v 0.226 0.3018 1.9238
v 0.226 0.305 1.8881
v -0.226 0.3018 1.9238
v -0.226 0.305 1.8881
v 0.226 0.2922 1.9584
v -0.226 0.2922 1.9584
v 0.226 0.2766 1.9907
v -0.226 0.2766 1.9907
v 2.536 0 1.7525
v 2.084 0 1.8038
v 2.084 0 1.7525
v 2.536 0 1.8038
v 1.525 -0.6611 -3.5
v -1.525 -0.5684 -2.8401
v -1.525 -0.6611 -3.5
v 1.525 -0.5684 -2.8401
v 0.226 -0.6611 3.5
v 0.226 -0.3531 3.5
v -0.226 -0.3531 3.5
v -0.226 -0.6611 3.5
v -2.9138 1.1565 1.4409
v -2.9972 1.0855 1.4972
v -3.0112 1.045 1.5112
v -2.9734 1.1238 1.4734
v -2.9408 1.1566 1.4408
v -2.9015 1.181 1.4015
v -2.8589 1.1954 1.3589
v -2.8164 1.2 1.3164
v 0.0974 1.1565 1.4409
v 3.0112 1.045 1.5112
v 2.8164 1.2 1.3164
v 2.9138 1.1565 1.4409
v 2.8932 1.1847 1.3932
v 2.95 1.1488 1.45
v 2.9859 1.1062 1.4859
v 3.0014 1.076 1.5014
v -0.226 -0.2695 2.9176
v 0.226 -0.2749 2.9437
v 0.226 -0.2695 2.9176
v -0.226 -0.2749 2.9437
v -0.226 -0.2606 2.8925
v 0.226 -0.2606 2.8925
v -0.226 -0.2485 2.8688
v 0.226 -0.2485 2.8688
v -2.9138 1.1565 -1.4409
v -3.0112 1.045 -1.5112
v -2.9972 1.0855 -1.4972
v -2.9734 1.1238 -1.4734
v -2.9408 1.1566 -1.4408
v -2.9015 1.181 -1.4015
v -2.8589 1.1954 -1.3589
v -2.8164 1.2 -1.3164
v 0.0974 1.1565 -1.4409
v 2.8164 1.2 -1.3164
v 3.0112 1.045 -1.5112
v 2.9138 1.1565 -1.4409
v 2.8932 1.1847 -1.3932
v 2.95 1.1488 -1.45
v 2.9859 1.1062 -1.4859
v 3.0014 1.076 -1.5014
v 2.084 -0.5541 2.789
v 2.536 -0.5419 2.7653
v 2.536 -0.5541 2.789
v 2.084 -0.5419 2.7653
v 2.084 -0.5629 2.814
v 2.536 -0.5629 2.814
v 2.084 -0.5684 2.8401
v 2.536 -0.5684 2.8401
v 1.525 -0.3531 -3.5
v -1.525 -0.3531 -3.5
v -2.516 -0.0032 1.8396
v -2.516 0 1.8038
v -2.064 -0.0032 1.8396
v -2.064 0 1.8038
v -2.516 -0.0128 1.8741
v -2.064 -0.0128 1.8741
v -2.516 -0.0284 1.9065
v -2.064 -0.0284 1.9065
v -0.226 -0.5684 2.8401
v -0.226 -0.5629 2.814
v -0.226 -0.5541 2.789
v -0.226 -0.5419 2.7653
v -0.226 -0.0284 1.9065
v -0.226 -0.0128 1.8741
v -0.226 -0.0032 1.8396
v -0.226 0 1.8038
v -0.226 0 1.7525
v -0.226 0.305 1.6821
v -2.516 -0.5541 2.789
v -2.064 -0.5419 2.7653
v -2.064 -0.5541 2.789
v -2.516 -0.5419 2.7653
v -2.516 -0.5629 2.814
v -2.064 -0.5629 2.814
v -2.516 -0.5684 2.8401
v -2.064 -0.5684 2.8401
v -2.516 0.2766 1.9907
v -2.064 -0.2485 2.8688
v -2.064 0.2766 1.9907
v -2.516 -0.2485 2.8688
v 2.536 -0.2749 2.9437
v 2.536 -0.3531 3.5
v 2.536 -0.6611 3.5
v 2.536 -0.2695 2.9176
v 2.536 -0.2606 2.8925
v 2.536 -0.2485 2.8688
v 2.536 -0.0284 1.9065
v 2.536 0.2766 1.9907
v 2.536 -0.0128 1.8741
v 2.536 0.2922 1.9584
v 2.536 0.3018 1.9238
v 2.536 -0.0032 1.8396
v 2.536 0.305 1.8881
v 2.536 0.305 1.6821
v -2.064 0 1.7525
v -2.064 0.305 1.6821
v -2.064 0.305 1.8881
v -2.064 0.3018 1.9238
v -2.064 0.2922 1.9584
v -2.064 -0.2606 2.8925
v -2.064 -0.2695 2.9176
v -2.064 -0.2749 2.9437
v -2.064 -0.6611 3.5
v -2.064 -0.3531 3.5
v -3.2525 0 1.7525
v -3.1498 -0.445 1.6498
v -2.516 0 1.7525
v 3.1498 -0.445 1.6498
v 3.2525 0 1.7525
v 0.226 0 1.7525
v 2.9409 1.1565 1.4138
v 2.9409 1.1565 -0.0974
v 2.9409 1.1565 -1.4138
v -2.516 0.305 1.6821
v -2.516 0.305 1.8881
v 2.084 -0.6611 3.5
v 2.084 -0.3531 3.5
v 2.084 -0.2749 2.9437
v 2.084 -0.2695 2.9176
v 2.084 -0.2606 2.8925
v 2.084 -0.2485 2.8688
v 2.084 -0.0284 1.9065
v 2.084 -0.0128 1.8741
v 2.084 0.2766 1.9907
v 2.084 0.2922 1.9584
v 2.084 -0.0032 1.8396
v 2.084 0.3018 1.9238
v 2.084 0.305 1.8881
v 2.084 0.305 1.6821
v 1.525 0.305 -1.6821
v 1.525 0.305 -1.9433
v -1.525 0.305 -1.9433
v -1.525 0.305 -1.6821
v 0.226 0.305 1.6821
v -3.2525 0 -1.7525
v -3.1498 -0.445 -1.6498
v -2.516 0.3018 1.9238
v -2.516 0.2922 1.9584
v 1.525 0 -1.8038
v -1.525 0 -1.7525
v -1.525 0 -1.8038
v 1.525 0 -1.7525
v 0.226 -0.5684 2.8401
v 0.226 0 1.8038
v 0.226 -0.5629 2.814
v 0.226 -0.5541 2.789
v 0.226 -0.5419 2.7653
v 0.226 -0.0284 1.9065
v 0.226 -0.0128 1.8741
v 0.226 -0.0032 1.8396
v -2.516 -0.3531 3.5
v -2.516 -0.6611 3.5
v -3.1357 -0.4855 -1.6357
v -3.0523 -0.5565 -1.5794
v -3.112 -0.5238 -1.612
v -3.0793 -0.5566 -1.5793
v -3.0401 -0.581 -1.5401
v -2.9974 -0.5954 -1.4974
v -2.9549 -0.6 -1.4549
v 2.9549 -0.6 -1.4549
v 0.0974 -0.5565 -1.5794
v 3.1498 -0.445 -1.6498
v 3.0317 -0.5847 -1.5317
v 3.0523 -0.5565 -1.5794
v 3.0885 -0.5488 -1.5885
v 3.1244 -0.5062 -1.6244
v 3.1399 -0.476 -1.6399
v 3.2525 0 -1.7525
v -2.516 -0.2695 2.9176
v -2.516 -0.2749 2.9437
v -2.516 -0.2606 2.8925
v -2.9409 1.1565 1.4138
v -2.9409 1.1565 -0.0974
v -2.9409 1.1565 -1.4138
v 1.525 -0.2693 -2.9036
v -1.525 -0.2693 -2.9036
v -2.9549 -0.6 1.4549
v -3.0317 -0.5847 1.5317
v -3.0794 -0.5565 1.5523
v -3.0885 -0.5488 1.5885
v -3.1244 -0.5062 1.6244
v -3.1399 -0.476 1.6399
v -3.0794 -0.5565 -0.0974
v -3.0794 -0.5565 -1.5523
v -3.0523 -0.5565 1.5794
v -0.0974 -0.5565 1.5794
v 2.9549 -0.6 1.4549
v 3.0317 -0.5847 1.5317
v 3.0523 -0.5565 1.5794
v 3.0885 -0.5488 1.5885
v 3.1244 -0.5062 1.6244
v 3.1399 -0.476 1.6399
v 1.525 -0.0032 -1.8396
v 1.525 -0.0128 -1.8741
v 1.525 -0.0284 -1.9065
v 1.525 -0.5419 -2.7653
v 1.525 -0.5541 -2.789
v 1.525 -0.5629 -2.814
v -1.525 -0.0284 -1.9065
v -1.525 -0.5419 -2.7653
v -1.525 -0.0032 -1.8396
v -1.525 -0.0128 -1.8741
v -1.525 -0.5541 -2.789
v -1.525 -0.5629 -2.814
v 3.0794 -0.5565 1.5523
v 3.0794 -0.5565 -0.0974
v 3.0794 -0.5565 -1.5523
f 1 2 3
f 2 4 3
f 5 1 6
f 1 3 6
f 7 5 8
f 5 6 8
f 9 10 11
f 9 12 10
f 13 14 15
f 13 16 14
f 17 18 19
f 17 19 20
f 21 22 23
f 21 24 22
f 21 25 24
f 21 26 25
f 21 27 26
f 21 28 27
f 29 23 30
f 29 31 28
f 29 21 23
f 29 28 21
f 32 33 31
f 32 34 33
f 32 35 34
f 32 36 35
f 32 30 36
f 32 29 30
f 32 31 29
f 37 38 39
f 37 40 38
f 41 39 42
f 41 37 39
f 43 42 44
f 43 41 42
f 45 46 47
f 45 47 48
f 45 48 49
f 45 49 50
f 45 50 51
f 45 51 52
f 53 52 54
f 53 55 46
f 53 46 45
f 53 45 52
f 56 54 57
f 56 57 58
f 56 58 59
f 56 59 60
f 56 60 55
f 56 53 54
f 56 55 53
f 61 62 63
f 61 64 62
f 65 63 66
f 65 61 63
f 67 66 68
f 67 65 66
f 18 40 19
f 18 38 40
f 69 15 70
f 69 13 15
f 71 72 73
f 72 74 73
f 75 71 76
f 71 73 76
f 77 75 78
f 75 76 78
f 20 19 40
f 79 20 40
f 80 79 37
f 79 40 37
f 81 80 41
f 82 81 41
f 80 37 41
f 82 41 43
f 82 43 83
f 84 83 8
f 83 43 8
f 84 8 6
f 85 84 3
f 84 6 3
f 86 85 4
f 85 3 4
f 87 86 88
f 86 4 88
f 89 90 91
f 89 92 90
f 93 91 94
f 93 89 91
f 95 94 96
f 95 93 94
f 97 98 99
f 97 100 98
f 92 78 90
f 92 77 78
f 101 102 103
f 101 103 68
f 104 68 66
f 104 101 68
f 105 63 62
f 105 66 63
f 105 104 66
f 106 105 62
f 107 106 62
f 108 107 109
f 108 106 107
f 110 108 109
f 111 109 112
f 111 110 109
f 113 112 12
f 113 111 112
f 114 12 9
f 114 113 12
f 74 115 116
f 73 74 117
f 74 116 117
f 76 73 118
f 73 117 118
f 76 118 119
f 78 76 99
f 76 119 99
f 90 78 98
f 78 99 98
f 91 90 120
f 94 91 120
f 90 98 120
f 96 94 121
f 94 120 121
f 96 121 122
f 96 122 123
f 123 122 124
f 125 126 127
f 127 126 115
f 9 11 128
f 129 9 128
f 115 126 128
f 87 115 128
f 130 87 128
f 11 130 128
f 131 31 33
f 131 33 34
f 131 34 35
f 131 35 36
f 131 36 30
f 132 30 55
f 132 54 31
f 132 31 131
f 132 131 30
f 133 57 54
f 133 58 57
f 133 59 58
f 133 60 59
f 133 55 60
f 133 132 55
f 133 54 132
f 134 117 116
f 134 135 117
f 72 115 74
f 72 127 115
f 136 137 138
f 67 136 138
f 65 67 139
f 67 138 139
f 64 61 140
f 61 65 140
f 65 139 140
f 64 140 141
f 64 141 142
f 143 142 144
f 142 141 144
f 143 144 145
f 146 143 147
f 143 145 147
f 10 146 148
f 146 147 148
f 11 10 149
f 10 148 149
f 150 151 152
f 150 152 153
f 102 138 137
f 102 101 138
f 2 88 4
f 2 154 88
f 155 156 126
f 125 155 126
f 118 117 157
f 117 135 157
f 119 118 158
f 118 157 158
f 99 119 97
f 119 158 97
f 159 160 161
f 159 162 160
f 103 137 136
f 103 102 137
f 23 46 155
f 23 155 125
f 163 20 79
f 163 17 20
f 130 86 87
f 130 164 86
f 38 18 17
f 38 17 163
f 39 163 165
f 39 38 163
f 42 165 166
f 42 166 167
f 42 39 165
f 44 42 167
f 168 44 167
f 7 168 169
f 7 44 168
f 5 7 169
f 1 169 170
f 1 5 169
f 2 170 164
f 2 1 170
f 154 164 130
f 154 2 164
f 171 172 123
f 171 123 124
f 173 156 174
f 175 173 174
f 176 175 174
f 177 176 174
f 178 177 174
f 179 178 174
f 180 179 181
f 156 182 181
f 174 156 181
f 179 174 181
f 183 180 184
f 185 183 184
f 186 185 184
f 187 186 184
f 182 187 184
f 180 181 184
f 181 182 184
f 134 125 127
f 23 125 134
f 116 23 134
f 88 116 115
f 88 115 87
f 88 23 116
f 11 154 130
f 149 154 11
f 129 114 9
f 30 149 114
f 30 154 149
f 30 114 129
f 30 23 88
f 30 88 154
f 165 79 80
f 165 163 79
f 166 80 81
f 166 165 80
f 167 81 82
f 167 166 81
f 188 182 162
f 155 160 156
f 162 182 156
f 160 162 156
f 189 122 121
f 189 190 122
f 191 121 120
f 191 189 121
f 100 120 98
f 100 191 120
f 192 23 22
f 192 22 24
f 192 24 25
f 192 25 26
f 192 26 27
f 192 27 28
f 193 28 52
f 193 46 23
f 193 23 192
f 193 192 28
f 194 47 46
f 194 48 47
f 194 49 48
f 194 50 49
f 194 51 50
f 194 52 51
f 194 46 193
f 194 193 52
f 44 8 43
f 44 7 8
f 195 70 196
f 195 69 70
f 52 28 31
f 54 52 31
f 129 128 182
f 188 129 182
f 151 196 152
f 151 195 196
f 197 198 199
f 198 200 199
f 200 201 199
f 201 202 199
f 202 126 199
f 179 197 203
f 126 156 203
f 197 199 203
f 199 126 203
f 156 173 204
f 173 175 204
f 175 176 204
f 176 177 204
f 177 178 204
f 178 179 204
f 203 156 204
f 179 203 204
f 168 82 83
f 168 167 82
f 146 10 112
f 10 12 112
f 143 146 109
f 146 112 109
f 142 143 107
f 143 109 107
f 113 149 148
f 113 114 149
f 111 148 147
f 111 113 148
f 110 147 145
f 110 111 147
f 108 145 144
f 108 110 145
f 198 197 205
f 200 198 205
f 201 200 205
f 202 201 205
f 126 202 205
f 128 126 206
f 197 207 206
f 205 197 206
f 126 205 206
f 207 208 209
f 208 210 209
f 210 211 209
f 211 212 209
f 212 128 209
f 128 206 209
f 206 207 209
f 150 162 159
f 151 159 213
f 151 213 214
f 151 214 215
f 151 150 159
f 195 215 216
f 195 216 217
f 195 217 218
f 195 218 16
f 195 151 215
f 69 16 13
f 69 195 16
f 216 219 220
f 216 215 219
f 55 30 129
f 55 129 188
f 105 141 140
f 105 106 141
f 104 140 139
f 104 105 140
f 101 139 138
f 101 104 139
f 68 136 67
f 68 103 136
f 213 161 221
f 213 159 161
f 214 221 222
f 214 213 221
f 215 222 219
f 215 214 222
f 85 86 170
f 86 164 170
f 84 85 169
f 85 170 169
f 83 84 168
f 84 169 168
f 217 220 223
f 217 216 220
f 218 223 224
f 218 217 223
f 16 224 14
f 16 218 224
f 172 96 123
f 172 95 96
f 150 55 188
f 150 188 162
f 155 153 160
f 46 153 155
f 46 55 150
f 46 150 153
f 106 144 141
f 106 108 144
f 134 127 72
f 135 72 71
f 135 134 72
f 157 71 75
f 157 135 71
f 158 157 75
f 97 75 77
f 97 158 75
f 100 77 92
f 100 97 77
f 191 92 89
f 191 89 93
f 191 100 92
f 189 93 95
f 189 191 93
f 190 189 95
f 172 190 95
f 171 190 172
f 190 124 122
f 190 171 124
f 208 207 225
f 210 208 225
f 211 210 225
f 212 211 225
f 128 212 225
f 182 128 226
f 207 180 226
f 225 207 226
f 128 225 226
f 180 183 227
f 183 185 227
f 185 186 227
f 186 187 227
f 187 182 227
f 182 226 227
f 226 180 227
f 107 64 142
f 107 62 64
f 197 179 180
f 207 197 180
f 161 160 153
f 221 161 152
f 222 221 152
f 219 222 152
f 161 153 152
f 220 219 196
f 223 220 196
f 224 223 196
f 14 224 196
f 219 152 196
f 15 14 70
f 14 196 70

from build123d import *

# Parameters (mm, degrees)
SKETCH5_W           = 6.505
SKETCH5_H           = 3.505
BOSS_EXTRUDE1_DEPTH = 1.2
BOSS_EXTRUDE1_TAPER = 13
SKETCH5_2_W         = 6.505
SKETCH5_2_H         = 3.505
BOSS_EXTRUDE2_DEPTH = 0.6
BOSS_EXTRUDE2_TAPER = 13
BOSS_EXTRUDE3_DEPTH = 0.226
BOSS_EXTRUDE4_DEPTH = 1.525
BOSS_EXTRUDE5_DEPTH = 0.226
BOSS_EXTRUDE6_DEPTH = 0.226
FILLET1_R           = 0.2
FILLET2_R           = 0.2


with BuildPart() as part:
    # Sketch5 → Boss-Extrude1 (new body)
    with BuildSketch(Plane(origin=(0, 0, 0), x_dir=(1, 0, 0), z_dir=(0, 1, 0))):
        Rectangle(SKETCH5_W, SKETCH5_H)
    extrude(amount=BOSS_EXTRUDE1_DEPTH, taper=BOSS_EXTRUDE1_TAPER)

    # Sketch5_2 → Boss-Extrude2 (add)
    with BuildSketch(Plane(origin=(0, 0, 0), x_dir=(1, 0, 0), z_dir=(0, 1, 0))):
        Rectangle(SKETCH5_2_W, SKETCH5_2_H)
    extrude(amount=-BOSS_EXTRUDE2_DEPTH, taper=BOSS_EXTRUDE2_TAPER)

    # Sketch6 → Boss-Extrude3 (add, symmetric)
    with BuildSketch(Plane(origin=(0, 0, 0), x_dir=(0, 0, -1), z_dir=(1, 0, 0))):
        Polygon((-2.903570514, -0.269279893), (-3.5, -0.35310259), (-3.5, -0.6611), (-2.8, -0.562721416), (-1.859056144, 0), (-1.7525, 0), (-1.682085202, 0.305), (-1.943299372, 0.305), align=None)
    boss_extrude3 = extrude(amount=BOSS_EXTRUDE3_DEPTH, both=True)

    # Mirror1: Boss-Extrude3 across plane
    add(boss_extrude3.mirror(Plane.XY))

    # Sketch7 → Boss-Extrude4 (add, symmetric)
    with BuildSketch(Plane(origin=(0, 0, 0), x_dir=(0, 0, -1), z_dir=(1, 0, 0))):
        Polygon((2.903570514, -0.269279893), (1.943299372, 0.305), (1.682085202, 0.305), (1.7525, 0), (1.859056144, 0), (2.8, -0.562721416), (3.5, -0.6611), (3.5, -0.35310259), align=None)
    extrude(amount=BOSS_EXTRUDE4_DEPTH, both=True)

    # Sketch8 → Boss-Extrude5 (add, symmetric)
    with BuildSketch(Plane.ZY.offset(2.29)):
        Polygon((1.859056144, 0), (2.8, -0.562721416), (3.5, -0.6611), (3.5, -0.35310259), (2.903570514, -0.269279893), (1.943299372, 0.305), (1.682085202, 0.305), (1.7525, 0), align=None)
    extrude(amount=BOSS_EXTRUDE5_DEPTH, both=True)

    # Sketch9 → Boss-Extrude6 (add, symmetric)
    with BuildSketch(Plane(origin=(2.31, 0, 0), x_dir=(0, 0, -1), z_dir=(1, 0, 0))):
        Polygon((-2.8, -0.562721416), (-1.859056144, 0), (-1.7525, 0), (-1.682085202, 0.305), (-1.943299372, 0.305), (-2.903570514, -0.269279893), (-3.5, -0.35310259), (-3.5, -0.6611), align=None)
    extrude(amount=BOSS_EXTRUDE6_DEPTH, both=True)

    # Fillet1
    fillet1_edges = [part.edges().sort_by_distance(p)[0] for p in [
        (-2.975458171, 1.2, 0),
        (0, 1.2, 1.475458171),
        (3.113979085, -0.6, 0),
        (0, -0.6, 1.613979085),
        (-3.113979085, -0.6, 0),
        (0, -0.6, -1.613979085),
        (2.975458171, 1.2, 0),
        (0, 1.2, -1.475458171),
    ]]
    fillet(fillet1_edges, radius=FILLET1_R)

    # Fillet2
    fillet2_edges = [part.edges().sort_by_distance(p)[0] for p in [
        (0, -0.562721416, -2.8),
        (0, 0, -1.859056144),
        (-2.29, -0.562721416, 2.8),
        (-2.29, 0, 1.859056144),
        (0, -0.562721416, 2.8),
        (0, 0, 1.859056144),
        (2.31, -0.562721416, 2.8),
        (2.31, 0, 1.859056144),
        (-2.29, 0.305, 1.943299372),
        (-2.29, -0.269279893, 2.903570514),
        (0, 0.305, 1.943299372),
        (0, -0.269279893, 2.903570514),
        (2.31, -0.269279893, 2.903570514),
        (2.31, 0.305, 1.943299372),
    ]]
    fillet(fillet2_edges, radius=FILLET2_R)


solid = part.part
